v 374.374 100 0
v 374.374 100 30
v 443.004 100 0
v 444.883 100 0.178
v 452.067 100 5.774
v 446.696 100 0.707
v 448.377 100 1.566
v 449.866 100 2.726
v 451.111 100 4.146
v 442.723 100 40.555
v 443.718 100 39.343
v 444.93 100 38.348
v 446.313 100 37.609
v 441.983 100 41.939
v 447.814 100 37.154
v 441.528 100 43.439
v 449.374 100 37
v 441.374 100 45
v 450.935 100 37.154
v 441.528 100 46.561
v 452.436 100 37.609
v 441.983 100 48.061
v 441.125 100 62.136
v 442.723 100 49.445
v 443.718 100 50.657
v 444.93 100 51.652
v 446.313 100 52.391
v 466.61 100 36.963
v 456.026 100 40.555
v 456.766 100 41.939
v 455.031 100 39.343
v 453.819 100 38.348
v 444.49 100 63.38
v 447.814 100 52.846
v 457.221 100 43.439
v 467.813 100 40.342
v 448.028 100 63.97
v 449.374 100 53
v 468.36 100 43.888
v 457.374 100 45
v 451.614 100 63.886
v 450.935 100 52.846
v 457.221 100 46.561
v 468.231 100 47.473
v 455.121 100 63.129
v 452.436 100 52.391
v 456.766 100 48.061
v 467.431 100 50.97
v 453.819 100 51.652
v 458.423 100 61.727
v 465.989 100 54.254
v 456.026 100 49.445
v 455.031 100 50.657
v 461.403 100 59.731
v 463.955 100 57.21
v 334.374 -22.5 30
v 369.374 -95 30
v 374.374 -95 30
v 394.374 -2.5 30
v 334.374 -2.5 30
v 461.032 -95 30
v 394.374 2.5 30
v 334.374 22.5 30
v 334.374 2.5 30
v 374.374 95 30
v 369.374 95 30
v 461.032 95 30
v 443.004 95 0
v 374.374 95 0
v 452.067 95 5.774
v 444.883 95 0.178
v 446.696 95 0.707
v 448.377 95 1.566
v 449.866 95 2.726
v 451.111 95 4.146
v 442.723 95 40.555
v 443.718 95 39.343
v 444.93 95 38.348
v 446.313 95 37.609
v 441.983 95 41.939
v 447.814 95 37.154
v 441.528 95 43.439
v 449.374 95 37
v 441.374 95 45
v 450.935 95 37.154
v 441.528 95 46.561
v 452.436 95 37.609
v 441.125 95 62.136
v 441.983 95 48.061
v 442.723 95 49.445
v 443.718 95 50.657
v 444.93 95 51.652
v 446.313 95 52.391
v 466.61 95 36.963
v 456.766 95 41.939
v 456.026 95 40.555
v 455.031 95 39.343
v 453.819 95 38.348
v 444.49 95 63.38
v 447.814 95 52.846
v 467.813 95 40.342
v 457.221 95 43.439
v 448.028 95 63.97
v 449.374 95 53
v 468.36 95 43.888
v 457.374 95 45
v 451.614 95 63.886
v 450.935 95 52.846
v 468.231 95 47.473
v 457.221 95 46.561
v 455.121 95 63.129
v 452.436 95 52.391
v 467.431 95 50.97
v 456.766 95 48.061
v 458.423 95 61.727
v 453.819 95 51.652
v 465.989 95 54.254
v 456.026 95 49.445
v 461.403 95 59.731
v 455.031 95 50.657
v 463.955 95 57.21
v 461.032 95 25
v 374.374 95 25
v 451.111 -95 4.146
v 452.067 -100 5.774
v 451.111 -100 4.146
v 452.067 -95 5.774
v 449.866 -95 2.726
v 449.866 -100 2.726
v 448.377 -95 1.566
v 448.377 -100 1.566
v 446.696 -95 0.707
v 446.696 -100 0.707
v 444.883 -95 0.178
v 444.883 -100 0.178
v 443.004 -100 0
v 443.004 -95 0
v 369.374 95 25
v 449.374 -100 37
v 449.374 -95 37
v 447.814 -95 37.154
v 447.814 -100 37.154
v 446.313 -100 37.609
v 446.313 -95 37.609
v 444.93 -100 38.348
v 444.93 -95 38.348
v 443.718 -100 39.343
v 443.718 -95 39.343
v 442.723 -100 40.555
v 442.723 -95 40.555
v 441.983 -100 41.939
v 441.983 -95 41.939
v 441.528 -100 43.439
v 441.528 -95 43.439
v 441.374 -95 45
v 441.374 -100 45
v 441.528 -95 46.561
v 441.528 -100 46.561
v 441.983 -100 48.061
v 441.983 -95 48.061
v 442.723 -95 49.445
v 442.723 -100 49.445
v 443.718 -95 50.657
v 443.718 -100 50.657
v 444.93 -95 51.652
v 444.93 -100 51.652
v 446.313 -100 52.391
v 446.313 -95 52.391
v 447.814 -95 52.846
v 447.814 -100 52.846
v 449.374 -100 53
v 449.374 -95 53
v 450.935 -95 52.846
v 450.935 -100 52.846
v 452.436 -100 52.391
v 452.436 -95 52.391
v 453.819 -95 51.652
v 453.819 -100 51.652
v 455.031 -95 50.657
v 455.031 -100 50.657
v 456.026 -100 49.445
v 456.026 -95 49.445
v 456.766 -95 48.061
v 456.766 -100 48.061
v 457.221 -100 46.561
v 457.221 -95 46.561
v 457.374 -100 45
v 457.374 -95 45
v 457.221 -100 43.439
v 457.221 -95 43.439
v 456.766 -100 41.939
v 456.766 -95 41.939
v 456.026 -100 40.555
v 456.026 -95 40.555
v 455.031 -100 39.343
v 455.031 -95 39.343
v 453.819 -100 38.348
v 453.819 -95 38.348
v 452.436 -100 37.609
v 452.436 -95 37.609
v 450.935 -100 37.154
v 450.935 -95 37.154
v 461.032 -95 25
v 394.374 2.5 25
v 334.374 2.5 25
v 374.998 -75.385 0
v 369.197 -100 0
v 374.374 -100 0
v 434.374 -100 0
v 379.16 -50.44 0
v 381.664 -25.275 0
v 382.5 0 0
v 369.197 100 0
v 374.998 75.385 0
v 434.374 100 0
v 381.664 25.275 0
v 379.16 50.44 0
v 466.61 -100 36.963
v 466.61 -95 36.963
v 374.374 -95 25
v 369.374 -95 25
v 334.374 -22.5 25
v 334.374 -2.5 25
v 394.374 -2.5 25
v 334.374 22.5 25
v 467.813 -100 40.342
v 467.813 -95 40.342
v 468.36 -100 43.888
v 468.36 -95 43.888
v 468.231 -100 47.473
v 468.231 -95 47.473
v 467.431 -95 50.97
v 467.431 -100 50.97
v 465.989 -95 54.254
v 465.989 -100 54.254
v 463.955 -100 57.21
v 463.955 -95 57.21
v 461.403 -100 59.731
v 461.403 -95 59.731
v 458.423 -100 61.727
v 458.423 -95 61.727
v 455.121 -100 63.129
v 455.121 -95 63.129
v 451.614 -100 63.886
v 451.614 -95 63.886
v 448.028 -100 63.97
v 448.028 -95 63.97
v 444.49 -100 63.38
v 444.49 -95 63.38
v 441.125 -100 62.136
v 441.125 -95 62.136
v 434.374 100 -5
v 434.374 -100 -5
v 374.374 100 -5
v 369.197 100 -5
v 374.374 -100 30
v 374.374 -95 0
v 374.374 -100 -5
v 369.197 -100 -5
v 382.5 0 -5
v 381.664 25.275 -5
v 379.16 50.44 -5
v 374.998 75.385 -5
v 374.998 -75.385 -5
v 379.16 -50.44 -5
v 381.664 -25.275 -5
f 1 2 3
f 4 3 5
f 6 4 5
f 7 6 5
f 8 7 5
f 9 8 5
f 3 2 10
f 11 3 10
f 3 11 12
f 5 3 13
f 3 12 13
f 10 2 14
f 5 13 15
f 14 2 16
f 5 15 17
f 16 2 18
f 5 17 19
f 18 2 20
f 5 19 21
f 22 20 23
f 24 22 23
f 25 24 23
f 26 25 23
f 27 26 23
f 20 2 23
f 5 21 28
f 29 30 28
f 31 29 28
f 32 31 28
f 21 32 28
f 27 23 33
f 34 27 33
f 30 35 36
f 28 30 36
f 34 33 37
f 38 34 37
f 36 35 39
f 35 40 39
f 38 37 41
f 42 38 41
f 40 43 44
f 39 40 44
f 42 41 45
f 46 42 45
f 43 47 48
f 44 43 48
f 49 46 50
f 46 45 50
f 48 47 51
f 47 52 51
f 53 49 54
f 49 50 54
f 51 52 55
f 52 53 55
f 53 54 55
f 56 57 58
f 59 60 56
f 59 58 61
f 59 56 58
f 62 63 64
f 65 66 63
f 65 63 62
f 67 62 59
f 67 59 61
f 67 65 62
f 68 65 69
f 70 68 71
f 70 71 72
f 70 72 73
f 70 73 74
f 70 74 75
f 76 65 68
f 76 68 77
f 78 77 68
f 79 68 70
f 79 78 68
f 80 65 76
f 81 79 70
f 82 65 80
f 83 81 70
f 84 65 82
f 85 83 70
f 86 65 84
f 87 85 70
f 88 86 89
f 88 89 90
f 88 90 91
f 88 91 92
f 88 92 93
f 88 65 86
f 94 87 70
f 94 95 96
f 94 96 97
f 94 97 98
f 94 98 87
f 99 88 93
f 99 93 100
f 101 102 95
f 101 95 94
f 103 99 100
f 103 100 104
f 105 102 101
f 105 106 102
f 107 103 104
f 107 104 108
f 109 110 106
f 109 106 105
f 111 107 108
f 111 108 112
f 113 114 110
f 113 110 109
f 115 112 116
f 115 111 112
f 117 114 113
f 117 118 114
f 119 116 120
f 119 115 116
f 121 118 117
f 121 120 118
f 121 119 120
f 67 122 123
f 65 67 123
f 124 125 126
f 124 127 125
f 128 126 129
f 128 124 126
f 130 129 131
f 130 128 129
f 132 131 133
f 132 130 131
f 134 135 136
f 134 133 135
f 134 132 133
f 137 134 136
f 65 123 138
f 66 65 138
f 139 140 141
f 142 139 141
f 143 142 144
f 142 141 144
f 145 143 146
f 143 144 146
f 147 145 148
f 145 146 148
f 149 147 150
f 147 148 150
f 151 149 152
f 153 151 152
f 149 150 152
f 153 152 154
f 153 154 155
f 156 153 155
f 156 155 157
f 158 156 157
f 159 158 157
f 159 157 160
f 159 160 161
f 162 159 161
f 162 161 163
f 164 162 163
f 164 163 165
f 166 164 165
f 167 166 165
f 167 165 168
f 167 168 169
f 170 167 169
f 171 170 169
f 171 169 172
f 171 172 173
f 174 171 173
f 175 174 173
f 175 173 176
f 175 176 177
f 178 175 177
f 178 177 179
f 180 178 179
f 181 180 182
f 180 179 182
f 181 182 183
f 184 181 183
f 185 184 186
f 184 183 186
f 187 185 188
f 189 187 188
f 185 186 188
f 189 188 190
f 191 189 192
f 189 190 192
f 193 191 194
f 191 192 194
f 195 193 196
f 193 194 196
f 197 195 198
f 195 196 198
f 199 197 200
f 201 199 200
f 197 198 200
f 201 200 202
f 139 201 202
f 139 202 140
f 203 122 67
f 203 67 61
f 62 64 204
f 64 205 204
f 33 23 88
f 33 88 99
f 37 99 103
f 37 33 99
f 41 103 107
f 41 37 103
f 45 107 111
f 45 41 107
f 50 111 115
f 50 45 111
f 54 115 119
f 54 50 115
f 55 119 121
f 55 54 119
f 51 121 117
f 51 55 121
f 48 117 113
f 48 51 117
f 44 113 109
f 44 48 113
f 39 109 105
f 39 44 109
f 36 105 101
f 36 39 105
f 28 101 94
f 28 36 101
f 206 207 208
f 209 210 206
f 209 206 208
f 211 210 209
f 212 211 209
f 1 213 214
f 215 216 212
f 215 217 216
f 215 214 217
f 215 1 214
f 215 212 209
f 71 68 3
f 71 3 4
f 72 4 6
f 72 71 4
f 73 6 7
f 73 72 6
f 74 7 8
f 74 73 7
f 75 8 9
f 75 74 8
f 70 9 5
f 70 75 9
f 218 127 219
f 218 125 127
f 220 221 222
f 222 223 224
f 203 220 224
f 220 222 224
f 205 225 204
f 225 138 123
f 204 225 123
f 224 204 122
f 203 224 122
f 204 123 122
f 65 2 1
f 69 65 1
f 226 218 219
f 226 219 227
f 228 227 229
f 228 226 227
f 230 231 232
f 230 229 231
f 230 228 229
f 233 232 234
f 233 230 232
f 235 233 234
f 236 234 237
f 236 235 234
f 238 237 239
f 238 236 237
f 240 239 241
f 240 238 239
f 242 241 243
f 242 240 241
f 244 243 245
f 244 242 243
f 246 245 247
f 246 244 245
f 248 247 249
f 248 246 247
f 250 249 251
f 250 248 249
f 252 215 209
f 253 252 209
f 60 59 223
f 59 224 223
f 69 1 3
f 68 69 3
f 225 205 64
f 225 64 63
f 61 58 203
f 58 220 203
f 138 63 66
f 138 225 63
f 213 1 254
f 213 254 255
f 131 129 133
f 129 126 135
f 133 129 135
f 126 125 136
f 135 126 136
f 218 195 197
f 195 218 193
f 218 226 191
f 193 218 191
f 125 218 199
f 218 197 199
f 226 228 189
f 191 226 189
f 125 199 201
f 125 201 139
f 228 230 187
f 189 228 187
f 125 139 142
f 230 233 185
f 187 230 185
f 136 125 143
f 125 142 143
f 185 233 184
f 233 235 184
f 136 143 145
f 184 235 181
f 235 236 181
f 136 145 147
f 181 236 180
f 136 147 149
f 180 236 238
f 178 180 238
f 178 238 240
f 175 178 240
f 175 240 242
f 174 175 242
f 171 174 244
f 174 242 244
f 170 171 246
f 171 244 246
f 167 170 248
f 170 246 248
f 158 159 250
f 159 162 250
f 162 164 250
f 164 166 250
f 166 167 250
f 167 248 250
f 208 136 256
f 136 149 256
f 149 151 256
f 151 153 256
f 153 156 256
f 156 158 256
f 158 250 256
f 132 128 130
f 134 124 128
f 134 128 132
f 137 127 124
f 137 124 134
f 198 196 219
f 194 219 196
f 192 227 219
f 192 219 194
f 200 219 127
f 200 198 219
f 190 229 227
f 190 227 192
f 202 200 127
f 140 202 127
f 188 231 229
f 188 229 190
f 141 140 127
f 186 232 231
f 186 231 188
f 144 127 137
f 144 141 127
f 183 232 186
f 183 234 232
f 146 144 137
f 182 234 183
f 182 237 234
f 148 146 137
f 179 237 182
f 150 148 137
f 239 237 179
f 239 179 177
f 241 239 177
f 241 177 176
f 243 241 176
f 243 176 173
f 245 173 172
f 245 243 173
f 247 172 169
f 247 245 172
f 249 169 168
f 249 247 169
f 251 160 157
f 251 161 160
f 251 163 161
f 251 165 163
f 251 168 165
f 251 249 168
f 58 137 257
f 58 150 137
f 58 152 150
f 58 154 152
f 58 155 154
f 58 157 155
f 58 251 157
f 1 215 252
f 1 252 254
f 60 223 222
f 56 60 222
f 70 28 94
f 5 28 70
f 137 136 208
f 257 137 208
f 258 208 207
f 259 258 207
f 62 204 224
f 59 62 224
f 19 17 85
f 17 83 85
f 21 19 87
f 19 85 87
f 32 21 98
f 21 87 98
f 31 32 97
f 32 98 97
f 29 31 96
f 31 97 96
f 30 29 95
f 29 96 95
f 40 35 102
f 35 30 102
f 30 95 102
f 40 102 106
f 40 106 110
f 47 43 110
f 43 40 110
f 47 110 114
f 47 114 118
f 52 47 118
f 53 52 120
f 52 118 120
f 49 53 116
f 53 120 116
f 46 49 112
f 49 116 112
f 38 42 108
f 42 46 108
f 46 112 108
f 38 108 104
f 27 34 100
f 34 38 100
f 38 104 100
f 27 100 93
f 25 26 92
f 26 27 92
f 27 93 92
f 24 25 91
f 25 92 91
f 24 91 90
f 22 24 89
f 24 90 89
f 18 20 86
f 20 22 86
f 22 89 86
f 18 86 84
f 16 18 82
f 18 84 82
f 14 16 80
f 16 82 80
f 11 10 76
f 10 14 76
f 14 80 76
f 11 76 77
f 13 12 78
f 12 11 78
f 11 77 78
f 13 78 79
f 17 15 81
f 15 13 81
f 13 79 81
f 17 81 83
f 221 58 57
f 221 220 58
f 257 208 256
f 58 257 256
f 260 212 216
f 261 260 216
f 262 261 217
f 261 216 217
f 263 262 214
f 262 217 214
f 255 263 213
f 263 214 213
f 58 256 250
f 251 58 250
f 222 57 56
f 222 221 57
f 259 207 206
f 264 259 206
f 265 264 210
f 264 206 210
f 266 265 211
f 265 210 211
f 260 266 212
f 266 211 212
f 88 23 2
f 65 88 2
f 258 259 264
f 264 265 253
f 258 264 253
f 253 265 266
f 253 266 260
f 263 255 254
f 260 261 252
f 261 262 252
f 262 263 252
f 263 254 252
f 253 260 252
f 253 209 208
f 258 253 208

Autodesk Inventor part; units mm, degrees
ref_plane "YZ Plane" through (0, 0, 0) normal (1, 0, 0) x (0, 1, 0)
ref_plane "Work Plane1" through (0, 0, 25) normal (0, 0, 1) x (1, 0, 0)
ref_plane "Work Plane2" through (0, -100, 0) normal (0, 1, 0) x (-1, 0, 0)
sketch "LayoutSK" plane through (0, 0, 25) normal (0, 0, 1) x (1, 0, 0)
  circle A0 centre (0, 0) radius 387.5 construction
  line L0 (0, 0) -> (387.5, 0) construction
  line L1 (374.3745, 100) -> (374.3745, -100) construction
  circle A1 centre (0, 0) radius 382.5
  dimension "dia" = 775
  dimension "d17" = 200
  dimension "d28" = 5
sketch "Sketch1" plane through (0, -100, 0) normal (0, 1, 0) x (-1, 0, 0)
  line L0 (-374.3745, 0) -> (-374.3745, 30)
  line L1 (-374.3745, 30) -> (-441.125, 62.1355)
  line L2 (-449.3745, 0) -> (-374.3745, 0)
  line L3 (-449.3745, 0) -> (-466.6105, 36.9627)
  arc A0 (-441.125, 62.1355) -> (-466.6105, 36.9627) centre (-449.3745, 45) ccw
  point P0 (0, 0)
  point P1 (-374.3745, 25)
  point P2 (-374.3745, 25)
  point P3 (-374.3745, 25)
  dimension "d0" = 30
  dimension "d2" = 75
  dimension "d13" = 45
  dimension "d14" = 75
  dimension "d15" = 115
extrude "Plate1" add sketch "Sketch1" along normal blind 5
sketch "Sketch2" plane through (0, -100, 0) normal (0, -1, 0) x (1, 0, 0)
  arc A0 (466.6105, 36.9627) -> (441.125, 62.1355) centre (449.3745, 45) ccw projected
  point P0 (0, 0)
hole "Hole1" at (449.3745, -100, 45) direction (0, 1, 0) diameter 16 end through all
mirror "Mirror1" about plane through (0, 0, 0) normal (0, 1, 0)
sketch "Sketch4" plane through (0, 0, 25) normal (0, 0, 1) x (1, 0, 0)
  line L0 (374.3745, -95) -> (461.0322, -95)
  line L1 (461.0322, -95) -> (461.0322, -100)
  line L2 (461.0322, -100) -> (374.3745, -100)
  line L3 (374.3745, 100) -> (461.0322, 100)
  line L4 (461.0322, 100) -> (461.0322, 95)
  line L5 (461.0322, 95) -> (374.3745, 95)
  line L6 (334.3745, 2.5) -> (394.3745, 2.5)
  line L7 (394.3745, 2.5) -> (394.3745, -2.5)
  line L8 (394.3745, -2.5) -> (334.3745, -2.5)
  line L9 (461.0322, 95) -> (461.0322, -95)
  line L10 (334.3745, 2.5) -> (334.3745, 22.5)
  line L11 (334.3745, -2.5) -> (334.3745, -22.5)
  line L12 (374.3745, -100) -> (374.3745, -95)
  line L13 (374.3745, 95) -> (374.3745, 100)
  line L14 (374.3745, 95) -> (369.3745, 95)
  line L15 (374.3745, -95) -> (369.3745, -95)
  line L16 (369.3745, -95) -> (334.3745, -22.5)
  line L17 (334.3745, 22.5) -> (369.3745, 95)
  point P0 (0, 0)
  point P1 (394.3745, 0)
  point P2 (461.0322, 0)
  dimension "d20" = 5
  dimension "d21" = 20
  dimension "d23" = 60
  dimension "d26" = 5
  dimension "d27" = 40
extrude "Plate2" add sketch "Sketch4" along normal blind 5 separate body contours L15 L16 L11 L8 L7 L6 L10 L17 L14 L5 L9 L0
sketch "Sketch5" plane through (0, 0, 0) normal (0, 0, 1) x (1, 0, 0)
  line L0 (449.3745, -100) -> (374.3745, -100)
  line L1 (449.3745, 100) -> (374.3745, 100)
  circle A0 centre (0, 0) radius 382.5
  line L2 (449.3745, -100) -> (449.3745, 100)
  line L3 (449.3745, 100) -> (369.1968, 100)
  line L4 (449.3745, -100) -> (369.1968, -100)
  line L5 (434.3745, 100) -> (434.3745, -100)
  point P0 (443.0038, 100)
  dimension "d30" = 15
extrude "Plate3" add sketch "Sketch5" against normal blind 5 separate body contours L0 L4 A0 L3 L1 L5
fillet "Corner Round1" radius 10 2 edges at (449.3745, -97.5, 0) (449.3745, 97.5, 0)
equation "\"d2\" = d14"
equation "\"d11\" = Thickness"
equation "\"d5\" = Thickness"
equation "\"d24\" = Thickness"
equation "\"d29\" = Thickness"
equation "\"BendRadius\" = Thickness"
equation "\"BendReliefWidth\" = Thickness"
equation "\"BendReliefDepth\" = 0.5 * Thickness"
equation "\"TransitionRadius\" = BendRadius"
equation "\"JacobiRadiusSize\" = BendRadius"
equation "\"GapSize\" = Thickness"
equation "\"Thickness\" = 5"
properties part number "PWTR-0135" material "Steel, High Strength, Low Alloy"
